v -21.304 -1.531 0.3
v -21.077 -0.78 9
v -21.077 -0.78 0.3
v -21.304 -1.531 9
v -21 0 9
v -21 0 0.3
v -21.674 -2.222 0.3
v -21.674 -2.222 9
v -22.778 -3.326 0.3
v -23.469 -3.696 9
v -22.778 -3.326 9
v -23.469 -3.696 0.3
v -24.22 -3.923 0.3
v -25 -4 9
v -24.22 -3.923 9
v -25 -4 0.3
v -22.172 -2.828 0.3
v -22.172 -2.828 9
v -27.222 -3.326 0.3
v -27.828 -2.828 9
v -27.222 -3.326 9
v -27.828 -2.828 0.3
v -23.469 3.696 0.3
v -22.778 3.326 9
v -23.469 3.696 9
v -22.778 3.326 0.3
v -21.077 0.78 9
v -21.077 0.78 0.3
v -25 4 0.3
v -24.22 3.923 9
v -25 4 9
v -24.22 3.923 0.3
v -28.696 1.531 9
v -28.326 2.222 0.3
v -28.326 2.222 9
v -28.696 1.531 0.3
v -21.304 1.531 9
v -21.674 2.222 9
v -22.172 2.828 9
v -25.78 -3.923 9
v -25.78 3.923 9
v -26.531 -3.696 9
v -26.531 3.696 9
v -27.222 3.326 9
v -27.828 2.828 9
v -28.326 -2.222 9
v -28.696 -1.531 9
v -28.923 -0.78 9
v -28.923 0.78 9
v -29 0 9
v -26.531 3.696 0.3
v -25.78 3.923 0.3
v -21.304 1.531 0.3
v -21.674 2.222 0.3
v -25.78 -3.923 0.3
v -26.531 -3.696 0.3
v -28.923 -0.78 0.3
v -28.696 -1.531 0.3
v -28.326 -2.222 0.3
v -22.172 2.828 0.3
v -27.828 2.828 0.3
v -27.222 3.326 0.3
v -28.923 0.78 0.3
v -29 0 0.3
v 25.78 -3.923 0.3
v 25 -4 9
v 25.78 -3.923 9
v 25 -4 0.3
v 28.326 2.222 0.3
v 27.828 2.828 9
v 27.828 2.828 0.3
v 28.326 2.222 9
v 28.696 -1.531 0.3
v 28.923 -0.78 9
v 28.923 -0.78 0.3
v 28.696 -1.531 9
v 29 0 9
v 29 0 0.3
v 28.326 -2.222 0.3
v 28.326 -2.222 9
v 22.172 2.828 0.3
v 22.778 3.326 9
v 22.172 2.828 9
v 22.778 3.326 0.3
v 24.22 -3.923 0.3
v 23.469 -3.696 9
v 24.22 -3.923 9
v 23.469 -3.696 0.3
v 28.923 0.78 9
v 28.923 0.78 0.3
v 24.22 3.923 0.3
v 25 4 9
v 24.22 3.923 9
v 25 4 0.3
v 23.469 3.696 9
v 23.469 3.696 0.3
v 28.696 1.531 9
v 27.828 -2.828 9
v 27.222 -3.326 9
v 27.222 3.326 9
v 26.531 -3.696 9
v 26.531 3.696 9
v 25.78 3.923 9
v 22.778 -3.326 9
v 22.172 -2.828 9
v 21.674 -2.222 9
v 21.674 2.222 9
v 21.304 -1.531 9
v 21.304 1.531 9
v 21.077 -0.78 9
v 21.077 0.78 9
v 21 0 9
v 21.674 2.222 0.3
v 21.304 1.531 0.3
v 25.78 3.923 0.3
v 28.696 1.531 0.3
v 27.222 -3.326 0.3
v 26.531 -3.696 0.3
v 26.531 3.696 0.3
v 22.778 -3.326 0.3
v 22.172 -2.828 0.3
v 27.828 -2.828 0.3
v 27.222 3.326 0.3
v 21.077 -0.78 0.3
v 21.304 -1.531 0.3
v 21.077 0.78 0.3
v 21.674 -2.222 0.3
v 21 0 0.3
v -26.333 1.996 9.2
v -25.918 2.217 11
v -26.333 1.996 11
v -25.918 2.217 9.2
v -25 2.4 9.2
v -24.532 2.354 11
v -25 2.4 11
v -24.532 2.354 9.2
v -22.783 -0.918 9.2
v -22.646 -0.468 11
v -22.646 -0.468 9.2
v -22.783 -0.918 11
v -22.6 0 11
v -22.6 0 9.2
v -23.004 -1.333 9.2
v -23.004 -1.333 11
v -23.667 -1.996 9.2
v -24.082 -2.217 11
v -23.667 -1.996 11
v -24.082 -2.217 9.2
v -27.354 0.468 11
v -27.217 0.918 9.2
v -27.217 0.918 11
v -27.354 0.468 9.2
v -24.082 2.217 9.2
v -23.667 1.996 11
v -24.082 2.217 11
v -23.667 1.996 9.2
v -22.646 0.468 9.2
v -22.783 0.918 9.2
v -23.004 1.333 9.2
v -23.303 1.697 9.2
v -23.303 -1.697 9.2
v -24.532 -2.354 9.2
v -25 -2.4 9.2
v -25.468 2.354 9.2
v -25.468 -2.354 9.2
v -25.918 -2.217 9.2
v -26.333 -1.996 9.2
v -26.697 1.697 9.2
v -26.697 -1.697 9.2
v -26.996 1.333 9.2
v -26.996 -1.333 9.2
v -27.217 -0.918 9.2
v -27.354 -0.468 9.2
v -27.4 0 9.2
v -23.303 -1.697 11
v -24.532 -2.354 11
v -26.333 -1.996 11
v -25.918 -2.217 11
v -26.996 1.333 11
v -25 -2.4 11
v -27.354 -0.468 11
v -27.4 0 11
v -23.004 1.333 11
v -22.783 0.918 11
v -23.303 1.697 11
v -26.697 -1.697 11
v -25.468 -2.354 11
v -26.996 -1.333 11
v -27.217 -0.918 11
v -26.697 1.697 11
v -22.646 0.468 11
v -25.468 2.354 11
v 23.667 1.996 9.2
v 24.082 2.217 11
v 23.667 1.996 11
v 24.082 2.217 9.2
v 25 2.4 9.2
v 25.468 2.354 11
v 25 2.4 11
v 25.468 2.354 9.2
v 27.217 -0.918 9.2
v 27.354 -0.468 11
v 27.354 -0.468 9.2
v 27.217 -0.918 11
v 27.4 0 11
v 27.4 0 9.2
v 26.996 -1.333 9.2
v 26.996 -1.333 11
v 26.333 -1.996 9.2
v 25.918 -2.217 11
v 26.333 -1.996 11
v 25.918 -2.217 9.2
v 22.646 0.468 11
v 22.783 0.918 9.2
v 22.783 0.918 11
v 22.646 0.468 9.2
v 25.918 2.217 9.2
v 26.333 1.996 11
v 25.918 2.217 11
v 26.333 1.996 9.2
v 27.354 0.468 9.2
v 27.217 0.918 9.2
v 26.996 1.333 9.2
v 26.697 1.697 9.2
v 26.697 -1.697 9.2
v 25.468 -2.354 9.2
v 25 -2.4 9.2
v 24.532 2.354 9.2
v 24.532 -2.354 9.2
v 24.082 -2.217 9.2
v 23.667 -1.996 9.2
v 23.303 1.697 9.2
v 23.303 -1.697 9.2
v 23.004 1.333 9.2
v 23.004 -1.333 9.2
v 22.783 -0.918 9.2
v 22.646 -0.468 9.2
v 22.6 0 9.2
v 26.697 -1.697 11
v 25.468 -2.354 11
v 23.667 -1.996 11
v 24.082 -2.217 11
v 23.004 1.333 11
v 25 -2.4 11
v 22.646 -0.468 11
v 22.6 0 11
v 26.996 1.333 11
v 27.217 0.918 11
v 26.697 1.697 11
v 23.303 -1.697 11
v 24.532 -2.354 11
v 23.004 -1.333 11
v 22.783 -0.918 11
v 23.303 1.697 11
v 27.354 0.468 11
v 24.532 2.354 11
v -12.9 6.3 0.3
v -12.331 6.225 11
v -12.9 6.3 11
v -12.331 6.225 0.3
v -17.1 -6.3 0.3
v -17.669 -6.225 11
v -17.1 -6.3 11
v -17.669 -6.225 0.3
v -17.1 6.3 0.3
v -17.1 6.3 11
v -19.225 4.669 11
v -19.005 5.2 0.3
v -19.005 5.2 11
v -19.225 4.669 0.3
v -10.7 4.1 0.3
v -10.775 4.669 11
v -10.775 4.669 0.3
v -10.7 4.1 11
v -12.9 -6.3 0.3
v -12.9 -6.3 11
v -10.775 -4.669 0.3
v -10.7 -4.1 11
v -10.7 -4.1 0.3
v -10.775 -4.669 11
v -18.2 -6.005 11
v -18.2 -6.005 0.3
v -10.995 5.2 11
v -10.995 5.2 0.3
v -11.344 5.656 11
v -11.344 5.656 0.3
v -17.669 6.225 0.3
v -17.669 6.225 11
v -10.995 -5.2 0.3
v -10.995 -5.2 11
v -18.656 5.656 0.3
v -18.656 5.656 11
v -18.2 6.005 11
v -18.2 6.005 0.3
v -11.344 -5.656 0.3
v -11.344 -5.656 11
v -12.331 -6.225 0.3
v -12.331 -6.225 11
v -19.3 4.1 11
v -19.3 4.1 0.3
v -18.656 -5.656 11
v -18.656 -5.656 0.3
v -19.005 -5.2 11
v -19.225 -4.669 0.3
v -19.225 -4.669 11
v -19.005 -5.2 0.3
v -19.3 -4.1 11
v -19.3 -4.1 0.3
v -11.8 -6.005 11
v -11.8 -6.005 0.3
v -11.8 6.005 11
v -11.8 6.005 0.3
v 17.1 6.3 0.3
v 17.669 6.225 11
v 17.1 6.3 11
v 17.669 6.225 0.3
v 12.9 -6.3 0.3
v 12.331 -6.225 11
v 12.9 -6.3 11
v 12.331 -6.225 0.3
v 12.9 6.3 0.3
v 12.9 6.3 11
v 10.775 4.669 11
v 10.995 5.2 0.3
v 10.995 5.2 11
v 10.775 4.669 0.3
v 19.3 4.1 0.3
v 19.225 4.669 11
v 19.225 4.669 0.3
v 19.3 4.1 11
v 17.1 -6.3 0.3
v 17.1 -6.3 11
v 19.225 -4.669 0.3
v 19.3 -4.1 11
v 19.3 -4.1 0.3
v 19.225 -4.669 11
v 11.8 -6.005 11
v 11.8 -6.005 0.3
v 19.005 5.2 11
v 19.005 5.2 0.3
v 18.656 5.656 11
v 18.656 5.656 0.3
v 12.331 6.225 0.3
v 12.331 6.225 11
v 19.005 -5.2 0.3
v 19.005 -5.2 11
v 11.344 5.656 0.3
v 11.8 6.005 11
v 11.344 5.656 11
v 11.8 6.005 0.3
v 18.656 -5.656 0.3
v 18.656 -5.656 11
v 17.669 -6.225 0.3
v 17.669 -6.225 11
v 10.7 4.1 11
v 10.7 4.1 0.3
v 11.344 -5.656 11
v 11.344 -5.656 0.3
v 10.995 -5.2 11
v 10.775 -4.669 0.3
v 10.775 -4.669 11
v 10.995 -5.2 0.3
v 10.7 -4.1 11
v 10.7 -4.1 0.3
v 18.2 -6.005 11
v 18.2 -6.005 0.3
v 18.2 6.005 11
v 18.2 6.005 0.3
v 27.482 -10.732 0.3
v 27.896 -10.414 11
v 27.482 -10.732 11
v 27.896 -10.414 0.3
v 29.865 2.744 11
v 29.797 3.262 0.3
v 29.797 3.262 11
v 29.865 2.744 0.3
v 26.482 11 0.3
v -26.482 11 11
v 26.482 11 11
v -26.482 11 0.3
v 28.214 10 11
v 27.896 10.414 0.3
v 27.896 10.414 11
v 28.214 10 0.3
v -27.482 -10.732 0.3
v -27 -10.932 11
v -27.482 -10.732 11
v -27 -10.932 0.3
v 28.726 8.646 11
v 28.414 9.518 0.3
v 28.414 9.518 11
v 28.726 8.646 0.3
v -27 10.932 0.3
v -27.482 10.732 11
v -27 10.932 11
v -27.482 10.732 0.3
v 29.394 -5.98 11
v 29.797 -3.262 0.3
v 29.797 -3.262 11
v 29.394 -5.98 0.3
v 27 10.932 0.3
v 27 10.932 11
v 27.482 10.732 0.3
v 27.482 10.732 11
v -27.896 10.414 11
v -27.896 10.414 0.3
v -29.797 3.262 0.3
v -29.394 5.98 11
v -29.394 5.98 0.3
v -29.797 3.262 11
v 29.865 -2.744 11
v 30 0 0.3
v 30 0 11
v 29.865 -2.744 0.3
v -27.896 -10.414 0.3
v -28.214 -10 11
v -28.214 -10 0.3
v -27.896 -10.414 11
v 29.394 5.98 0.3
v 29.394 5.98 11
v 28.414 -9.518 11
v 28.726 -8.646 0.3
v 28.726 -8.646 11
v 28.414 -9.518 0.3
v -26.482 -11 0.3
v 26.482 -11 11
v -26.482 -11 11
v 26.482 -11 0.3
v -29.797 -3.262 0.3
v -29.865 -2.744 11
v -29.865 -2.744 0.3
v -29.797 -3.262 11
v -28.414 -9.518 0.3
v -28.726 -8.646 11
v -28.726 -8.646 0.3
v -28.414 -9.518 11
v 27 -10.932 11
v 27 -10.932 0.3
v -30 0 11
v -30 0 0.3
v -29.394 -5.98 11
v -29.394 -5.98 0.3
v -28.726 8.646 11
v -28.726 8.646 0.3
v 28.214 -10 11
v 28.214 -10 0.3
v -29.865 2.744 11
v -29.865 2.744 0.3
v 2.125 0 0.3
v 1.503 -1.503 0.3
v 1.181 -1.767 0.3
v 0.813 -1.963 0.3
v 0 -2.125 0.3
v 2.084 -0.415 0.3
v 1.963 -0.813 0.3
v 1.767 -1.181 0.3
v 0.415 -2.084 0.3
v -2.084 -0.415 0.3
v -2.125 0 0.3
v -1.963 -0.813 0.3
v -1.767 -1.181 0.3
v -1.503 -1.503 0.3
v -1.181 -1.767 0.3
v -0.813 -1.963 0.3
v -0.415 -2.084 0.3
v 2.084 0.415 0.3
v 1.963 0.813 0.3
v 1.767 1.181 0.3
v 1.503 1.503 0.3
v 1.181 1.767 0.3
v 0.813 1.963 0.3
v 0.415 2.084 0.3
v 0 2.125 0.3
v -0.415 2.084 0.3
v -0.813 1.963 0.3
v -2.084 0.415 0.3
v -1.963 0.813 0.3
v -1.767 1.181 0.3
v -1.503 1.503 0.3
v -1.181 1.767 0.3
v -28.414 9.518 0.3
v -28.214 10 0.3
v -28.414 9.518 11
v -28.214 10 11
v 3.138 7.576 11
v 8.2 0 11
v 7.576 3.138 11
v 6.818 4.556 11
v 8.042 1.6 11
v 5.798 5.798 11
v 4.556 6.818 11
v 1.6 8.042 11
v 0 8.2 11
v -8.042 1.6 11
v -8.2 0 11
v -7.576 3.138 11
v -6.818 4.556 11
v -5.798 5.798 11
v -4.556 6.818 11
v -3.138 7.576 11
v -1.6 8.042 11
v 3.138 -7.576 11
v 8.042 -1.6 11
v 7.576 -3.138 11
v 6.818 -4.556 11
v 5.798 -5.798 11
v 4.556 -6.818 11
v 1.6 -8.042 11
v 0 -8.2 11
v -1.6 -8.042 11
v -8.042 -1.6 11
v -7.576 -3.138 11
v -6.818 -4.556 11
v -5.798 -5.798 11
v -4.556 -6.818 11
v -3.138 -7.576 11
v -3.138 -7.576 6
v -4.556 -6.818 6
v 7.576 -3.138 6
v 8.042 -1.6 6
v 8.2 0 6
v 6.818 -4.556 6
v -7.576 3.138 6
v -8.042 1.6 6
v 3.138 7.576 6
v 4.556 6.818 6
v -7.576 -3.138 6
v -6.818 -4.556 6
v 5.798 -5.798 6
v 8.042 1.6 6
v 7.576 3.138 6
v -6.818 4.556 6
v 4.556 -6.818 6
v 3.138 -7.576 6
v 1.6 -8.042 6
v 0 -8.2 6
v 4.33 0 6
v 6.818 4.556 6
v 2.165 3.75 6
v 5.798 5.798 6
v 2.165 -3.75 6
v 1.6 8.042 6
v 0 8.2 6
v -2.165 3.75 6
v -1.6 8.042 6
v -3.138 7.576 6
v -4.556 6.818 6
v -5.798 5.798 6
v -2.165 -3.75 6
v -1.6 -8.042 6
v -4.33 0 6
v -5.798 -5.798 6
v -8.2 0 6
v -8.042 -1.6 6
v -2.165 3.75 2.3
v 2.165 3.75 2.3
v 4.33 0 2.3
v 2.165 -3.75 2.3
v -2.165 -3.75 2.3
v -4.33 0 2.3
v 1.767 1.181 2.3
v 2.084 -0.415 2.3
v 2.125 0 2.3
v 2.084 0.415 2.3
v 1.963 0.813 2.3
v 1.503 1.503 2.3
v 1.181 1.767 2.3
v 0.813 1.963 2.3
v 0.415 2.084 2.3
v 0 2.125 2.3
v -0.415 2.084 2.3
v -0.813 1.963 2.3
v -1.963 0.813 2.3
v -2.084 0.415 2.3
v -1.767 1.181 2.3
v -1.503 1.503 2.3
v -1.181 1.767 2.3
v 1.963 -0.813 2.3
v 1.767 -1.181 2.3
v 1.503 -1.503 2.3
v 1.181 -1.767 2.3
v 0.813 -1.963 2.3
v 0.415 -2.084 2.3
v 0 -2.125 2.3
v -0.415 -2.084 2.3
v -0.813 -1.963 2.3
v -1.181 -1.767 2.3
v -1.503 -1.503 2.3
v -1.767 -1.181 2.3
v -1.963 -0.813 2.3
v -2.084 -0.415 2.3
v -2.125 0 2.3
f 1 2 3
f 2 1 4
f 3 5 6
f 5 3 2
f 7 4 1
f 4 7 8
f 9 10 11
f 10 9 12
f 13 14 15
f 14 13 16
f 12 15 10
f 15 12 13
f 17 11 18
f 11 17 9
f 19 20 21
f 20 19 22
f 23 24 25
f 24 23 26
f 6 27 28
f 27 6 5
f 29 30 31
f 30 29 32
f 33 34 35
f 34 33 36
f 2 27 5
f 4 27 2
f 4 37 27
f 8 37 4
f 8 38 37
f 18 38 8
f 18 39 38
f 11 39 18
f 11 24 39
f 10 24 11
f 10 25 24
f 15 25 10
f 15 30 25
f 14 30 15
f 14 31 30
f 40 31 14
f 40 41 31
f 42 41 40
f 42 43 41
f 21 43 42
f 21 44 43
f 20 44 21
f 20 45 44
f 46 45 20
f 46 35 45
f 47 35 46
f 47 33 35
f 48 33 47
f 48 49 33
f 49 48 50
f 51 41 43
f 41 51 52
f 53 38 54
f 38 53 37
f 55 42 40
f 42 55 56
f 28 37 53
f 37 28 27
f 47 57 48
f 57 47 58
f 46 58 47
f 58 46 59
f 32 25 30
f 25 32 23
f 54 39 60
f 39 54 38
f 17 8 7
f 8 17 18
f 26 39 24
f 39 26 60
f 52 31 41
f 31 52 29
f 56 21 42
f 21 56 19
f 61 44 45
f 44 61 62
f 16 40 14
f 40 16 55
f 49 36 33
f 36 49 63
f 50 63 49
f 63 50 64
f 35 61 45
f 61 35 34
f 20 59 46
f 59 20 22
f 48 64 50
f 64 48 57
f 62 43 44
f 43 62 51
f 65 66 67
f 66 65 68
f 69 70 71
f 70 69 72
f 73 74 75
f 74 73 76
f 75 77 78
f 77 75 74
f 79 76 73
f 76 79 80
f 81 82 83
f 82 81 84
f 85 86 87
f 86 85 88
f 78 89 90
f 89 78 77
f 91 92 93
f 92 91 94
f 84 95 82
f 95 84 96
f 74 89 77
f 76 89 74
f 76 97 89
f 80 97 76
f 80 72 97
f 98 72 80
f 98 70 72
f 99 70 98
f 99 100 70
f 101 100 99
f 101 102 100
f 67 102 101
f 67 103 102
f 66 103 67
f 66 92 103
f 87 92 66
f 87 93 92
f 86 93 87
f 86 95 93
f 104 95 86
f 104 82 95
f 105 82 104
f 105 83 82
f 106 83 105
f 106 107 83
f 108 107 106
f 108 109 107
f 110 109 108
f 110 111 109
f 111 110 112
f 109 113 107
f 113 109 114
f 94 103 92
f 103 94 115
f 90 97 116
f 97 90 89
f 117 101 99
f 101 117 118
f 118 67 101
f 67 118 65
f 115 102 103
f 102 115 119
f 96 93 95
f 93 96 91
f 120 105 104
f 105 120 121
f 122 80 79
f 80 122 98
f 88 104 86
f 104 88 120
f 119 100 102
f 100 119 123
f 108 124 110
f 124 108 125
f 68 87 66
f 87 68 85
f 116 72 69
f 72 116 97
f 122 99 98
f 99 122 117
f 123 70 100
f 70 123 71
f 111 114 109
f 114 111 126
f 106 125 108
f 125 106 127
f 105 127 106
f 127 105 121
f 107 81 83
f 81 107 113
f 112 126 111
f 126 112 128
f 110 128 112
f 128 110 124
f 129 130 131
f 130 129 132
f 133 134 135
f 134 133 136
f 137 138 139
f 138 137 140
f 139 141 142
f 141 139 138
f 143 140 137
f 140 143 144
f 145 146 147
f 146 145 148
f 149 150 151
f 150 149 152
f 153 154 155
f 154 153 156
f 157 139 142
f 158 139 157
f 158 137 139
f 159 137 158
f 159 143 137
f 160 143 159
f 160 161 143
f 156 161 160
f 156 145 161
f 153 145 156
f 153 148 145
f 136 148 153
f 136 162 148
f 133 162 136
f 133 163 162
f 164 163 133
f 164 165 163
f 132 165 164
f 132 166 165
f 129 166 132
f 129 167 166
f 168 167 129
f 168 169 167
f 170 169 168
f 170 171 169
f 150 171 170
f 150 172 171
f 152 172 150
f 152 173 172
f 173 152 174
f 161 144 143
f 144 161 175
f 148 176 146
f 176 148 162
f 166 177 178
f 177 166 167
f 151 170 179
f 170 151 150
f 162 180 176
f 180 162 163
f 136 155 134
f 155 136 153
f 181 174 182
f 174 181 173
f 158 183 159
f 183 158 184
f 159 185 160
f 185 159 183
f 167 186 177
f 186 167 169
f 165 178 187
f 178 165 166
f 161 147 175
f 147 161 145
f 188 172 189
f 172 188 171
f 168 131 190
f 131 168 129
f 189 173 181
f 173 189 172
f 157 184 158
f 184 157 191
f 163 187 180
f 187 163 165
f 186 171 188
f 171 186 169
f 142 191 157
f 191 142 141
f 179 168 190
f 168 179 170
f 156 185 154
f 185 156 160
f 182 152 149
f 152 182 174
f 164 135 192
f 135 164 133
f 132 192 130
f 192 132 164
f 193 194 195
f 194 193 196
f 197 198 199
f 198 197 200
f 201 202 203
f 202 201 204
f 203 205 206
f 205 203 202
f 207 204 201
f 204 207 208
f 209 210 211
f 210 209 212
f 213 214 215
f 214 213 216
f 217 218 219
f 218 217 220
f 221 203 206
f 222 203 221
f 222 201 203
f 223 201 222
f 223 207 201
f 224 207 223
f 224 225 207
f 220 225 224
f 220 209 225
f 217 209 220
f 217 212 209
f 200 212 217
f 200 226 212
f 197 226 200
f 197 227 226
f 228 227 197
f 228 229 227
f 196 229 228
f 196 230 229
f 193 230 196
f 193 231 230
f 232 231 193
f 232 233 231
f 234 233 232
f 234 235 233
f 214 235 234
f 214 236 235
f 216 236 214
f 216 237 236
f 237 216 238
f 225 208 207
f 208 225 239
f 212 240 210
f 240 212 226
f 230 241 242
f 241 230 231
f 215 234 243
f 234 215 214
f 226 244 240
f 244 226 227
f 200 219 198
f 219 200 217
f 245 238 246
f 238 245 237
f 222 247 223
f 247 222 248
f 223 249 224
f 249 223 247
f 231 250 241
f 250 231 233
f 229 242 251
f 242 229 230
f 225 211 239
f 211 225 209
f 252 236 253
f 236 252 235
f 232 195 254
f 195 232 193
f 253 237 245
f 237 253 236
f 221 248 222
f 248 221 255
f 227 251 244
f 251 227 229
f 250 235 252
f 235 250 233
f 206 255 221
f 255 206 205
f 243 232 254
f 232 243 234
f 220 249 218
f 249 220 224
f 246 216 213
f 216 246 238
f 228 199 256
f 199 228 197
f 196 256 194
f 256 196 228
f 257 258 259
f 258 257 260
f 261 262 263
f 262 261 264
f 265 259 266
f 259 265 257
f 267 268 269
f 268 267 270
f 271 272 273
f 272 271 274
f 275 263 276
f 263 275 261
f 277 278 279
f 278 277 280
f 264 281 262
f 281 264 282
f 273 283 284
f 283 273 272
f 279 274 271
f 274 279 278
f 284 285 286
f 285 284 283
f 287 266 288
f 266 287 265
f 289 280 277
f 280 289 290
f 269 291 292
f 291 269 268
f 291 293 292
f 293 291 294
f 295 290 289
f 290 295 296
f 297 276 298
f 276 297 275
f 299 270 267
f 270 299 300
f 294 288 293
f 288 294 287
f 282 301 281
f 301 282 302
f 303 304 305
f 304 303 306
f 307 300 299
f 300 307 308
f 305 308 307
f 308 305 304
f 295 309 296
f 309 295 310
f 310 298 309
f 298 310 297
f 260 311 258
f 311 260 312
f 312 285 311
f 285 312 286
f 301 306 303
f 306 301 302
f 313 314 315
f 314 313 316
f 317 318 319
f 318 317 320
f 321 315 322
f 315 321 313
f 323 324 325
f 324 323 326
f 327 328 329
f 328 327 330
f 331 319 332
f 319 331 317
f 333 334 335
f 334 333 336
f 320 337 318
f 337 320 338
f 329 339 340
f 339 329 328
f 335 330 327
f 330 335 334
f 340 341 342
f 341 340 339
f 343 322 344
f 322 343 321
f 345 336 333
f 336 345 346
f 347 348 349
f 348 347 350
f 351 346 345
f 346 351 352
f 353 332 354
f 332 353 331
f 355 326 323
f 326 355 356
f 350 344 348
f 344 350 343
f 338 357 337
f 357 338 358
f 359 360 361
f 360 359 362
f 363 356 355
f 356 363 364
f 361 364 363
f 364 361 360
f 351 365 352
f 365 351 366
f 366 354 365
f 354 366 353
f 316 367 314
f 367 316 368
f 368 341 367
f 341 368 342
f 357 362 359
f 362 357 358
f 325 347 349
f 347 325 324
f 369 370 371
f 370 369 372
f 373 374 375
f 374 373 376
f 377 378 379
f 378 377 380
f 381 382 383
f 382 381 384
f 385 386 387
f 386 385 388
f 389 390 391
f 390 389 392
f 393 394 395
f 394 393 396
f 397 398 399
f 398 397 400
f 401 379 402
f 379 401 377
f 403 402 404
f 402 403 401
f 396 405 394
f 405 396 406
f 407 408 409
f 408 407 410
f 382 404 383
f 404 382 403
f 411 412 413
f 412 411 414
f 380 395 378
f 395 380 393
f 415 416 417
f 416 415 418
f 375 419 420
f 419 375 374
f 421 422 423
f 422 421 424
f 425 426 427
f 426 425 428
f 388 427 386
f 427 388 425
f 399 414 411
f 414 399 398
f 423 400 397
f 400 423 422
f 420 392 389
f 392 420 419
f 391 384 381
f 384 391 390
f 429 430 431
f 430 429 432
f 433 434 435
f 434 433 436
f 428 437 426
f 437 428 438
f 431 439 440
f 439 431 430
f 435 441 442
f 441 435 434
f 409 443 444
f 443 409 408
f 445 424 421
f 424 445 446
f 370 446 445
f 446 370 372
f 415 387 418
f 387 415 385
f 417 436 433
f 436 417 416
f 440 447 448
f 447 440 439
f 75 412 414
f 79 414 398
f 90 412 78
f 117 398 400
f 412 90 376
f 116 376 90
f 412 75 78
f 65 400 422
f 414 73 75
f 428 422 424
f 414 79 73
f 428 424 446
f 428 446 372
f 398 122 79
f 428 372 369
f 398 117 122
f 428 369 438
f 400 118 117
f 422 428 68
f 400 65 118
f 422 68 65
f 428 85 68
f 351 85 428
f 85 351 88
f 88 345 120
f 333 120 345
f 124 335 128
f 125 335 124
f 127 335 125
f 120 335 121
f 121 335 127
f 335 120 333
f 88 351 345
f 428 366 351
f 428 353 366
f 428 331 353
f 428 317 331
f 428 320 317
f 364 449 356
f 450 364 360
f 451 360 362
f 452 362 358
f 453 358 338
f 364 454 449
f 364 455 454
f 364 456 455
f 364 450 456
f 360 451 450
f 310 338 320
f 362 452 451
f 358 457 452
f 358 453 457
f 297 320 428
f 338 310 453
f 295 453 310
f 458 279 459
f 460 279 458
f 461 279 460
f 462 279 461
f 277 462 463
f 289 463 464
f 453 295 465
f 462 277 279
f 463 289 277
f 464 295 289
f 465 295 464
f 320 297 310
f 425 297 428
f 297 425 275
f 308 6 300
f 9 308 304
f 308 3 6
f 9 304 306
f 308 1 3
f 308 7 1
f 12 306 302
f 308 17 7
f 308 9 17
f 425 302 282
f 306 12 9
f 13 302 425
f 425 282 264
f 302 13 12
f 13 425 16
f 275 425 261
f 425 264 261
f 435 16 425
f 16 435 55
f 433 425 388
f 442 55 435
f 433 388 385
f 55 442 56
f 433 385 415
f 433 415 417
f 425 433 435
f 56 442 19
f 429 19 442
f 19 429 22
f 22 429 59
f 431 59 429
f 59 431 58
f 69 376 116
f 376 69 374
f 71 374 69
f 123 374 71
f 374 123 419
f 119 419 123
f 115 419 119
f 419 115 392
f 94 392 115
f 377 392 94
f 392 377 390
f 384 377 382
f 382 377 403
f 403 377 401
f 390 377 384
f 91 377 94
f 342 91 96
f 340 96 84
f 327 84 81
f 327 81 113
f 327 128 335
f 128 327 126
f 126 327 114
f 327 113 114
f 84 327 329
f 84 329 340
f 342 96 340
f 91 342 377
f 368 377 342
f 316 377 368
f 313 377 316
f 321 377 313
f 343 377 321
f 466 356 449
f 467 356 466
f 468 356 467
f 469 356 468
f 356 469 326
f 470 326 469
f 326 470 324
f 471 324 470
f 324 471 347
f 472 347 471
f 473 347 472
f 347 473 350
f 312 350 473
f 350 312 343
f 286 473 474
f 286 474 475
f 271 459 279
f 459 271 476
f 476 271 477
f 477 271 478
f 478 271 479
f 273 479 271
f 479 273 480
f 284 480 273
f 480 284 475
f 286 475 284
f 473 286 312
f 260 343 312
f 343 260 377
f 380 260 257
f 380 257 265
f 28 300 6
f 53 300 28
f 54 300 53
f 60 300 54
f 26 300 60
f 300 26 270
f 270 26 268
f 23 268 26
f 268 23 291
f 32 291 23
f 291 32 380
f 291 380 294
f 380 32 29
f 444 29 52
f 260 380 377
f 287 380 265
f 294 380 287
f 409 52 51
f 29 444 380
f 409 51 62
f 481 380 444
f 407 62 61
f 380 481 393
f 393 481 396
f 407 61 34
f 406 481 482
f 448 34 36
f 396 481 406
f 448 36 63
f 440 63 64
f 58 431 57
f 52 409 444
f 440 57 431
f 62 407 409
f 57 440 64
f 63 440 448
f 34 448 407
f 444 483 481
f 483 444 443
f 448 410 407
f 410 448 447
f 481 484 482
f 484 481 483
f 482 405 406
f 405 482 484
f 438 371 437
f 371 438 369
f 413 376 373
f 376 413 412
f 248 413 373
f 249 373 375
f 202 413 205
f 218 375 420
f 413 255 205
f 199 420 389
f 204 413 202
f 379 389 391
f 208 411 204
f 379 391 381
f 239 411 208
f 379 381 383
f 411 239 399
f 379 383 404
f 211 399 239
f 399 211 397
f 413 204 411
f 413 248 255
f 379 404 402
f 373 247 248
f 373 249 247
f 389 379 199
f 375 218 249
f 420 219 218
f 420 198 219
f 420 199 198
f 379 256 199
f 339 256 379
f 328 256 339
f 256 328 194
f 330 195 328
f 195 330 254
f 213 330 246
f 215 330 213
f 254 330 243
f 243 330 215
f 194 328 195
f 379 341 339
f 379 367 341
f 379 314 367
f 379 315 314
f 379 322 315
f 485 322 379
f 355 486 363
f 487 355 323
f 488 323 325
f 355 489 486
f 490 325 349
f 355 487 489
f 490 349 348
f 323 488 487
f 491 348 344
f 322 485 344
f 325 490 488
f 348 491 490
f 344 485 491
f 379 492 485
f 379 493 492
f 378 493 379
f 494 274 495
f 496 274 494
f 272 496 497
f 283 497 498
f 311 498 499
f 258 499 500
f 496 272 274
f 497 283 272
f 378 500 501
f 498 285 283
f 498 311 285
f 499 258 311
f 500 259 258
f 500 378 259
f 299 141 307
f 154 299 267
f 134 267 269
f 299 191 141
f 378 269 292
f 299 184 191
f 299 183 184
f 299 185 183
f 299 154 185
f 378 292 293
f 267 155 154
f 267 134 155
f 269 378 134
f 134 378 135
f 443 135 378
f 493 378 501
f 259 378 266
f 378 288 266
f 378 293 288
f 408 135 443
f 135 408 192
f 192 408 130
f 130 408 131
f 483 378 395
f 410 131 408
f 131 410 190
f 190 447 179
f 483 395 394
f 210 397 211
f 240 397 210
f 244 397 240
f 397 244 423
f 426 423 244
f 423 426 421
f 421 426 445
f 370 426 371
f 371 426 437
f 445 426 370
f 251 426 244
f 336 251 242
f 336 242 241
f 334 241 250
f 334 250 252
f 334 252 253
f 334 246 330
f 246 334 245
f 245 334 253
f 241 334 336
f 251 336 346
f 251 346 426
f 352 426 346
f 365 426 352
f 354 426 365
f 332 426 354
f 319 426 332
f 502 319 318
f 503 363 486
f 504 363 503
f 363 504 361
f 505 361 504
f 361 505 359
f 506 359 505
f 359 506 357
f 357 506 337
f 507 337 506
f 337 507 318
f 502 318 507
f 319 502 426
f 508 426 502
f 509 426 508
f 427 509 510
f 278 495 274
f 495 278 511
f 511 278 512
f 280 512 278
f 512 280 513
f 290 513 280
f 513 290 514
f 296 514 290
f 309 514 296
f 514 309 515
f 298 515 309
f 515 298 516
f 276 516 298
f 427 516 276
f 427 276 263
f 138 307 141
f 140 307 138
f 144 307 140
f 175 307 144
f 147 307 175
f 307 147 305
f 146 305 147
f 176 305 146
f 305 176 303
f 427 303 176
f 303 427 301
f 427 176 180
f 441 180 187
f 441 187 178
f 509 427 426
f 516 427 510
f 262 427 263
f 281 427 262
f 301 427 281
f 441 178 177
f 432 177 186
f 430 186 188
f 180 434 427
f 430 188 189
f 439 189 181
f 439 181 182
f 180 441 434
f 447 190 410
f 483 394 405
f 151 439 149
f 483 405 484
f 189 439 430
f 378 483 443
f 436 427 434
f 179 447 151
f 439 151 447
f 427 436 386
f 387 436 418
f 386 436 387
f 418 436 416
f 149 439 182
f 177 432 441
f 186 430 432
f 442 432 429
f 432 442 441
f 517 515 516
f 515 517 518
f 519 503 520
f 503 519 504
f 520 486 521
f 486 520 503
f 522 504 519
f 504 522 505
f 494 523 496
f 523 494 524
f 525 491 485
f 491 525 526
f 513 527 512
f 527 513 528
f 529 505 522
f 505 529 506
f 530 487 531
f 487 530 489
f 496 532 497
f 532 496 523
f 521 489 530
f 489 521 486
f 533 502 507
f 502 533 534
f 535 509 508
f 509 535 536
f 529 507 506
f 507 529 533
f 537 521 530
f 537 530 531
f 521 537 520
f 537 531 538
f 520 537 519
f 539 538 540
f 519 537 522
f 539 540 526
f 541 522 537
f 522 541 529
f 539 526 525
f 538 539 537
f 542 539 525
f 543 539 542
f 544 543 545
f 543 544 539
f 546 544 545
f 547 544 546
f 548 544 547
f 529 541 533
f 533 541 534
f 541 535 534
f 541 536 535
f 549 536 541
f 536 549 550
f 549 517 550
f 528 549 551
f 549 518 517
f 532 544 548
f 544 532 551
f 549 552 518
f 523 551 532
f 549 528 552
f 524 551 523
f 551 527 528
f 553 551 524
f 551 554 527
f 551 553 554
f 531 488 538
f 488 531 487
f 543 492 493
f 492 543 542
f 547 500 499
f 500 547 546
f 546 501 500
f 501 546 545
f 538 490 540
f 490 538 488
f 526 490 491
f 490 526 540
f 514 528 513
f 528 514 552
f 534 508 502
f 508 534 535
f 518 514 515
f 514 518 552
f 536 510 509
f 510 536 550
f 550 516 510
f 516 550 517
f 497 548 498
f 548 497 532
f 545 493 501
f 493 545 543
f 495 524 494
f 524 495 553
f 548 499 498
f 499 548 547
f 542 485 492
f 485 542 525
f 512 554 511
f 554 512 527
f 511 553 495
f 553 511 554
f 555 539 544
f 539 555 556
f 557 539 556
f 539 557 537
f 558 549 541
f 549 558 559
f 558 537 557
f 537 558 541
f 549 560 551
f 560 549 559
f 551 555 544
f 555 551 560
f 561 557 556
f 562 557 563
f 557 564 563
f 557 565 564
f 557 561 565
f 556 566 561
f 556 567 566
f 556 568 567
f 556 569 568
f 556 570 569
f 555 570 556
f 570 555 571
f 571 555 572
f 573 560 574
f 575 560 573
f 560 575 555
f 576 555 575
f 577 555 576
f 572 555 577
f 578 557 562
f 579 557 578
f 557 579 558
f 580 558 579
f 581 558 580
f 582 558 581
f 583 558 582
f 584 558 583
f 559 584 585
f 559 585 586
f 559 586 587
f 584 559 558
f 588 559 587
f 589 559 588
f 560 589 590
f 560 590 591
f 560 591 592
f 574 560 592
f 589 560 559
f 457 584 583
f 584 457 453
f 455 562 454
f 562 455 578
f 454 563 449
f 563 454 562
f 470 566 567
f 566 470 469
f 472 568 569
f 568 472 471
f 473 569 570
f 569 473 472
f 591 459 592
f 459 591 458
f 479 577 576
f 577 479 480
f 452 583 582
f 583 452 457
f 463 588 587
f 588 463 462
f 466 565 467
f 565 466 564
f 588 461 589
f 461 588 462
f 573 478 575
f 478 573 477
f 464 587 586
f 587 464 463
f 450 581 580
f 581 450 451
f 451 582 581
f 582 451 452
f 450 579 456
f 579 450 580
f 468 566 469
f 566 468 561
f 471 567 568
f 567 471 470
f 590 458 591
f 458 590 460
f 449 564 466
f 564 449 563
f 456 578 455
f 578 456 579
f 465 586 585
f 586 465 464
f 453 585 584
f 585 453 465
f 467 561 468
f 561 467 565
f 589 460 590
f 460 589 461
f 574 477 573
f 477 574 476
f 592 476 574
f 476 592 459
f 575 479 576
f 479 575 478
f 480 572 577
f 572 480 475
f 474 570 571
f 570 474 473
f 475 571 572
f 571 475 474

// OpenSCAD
nut_w=7 + 0.5;     // nut width across flats 10 for M6, 8 for M5, 7 for M4
nut_t=3.2 + 0.5;   // nut thickness 5 fo M6, 4 for M5, 3.2 for M4
tube_od=4 + 0.25;  // dia of tube or pneumatic fitting

module bowden_clamp() difference() {
	linear_extrude(height=5+nut_t+2,convexity=30) difference() {
		// basic shape
		minkowski() {
			intersection() {
				square([60-2,22-4],center=true);
				circle(r=30-2,$fn=64);
			}
			// rounded corners
			circle(r=2,$fn=24);
		}
	}
	// M4 socket heads
	for(x=[-25,25]) translate([x,0,2])
		cylinder(r=4,h=12,$fn=32);

	// M4 Mounting holes
	for(x=[-25,25]) translate([x,0,-1])
		cylinder(r=2.4,h=2.8,$fn=32);

	// groove mount
	translate([0,0,-1]) cylinder(r=8.2,h=6,$fn=32);

	// captive nut
	cylinder(r=nut_w/sqrt(3),h=5+nut_t,$fn=6);

	// tube
	cylinder(r=tube_od/2,h=14,$fn=32);

	// unnecessary vents
	for(x=[-15,15]) translate([x,0,-1]) minkowski() {
		cube([4.2,8.2,13],center=true);
		cylinder(r=2.2,h=13,$fn=24);
	}
}

module wood_mount() difference() {
	// basic shape
	minkowski() {
		intersection() {
			square([60-1.8,22-3.6],center=true);
			circle(r=30-1.8,$fn=64);
		}
		// rounded corners
		circle(r=2,$fn=24);
	}
	// M4 Mounting holes
	for(x=[-25,25]) translate([x,0])
		circle(r=2,$fn=32);

	// groove mount
	circle(r=5.9,$fn=32);
	translate([0,-11]) square([11.8,22], center=true);

	// unnecessary vents
	for(x=[-15,15]) translate([x,0]) minkowski() {
		square([4,8],center=true);
		circle(r=2,$fn=24);
	}

}

%translate([0,0,-5]) linear_extrude(height=5,convexity=30) wood_mount();
bowden_clamp();

!translate([0,0,11]) rotate([180,0,0]) bowden_clamp();
*!wood_mount();
